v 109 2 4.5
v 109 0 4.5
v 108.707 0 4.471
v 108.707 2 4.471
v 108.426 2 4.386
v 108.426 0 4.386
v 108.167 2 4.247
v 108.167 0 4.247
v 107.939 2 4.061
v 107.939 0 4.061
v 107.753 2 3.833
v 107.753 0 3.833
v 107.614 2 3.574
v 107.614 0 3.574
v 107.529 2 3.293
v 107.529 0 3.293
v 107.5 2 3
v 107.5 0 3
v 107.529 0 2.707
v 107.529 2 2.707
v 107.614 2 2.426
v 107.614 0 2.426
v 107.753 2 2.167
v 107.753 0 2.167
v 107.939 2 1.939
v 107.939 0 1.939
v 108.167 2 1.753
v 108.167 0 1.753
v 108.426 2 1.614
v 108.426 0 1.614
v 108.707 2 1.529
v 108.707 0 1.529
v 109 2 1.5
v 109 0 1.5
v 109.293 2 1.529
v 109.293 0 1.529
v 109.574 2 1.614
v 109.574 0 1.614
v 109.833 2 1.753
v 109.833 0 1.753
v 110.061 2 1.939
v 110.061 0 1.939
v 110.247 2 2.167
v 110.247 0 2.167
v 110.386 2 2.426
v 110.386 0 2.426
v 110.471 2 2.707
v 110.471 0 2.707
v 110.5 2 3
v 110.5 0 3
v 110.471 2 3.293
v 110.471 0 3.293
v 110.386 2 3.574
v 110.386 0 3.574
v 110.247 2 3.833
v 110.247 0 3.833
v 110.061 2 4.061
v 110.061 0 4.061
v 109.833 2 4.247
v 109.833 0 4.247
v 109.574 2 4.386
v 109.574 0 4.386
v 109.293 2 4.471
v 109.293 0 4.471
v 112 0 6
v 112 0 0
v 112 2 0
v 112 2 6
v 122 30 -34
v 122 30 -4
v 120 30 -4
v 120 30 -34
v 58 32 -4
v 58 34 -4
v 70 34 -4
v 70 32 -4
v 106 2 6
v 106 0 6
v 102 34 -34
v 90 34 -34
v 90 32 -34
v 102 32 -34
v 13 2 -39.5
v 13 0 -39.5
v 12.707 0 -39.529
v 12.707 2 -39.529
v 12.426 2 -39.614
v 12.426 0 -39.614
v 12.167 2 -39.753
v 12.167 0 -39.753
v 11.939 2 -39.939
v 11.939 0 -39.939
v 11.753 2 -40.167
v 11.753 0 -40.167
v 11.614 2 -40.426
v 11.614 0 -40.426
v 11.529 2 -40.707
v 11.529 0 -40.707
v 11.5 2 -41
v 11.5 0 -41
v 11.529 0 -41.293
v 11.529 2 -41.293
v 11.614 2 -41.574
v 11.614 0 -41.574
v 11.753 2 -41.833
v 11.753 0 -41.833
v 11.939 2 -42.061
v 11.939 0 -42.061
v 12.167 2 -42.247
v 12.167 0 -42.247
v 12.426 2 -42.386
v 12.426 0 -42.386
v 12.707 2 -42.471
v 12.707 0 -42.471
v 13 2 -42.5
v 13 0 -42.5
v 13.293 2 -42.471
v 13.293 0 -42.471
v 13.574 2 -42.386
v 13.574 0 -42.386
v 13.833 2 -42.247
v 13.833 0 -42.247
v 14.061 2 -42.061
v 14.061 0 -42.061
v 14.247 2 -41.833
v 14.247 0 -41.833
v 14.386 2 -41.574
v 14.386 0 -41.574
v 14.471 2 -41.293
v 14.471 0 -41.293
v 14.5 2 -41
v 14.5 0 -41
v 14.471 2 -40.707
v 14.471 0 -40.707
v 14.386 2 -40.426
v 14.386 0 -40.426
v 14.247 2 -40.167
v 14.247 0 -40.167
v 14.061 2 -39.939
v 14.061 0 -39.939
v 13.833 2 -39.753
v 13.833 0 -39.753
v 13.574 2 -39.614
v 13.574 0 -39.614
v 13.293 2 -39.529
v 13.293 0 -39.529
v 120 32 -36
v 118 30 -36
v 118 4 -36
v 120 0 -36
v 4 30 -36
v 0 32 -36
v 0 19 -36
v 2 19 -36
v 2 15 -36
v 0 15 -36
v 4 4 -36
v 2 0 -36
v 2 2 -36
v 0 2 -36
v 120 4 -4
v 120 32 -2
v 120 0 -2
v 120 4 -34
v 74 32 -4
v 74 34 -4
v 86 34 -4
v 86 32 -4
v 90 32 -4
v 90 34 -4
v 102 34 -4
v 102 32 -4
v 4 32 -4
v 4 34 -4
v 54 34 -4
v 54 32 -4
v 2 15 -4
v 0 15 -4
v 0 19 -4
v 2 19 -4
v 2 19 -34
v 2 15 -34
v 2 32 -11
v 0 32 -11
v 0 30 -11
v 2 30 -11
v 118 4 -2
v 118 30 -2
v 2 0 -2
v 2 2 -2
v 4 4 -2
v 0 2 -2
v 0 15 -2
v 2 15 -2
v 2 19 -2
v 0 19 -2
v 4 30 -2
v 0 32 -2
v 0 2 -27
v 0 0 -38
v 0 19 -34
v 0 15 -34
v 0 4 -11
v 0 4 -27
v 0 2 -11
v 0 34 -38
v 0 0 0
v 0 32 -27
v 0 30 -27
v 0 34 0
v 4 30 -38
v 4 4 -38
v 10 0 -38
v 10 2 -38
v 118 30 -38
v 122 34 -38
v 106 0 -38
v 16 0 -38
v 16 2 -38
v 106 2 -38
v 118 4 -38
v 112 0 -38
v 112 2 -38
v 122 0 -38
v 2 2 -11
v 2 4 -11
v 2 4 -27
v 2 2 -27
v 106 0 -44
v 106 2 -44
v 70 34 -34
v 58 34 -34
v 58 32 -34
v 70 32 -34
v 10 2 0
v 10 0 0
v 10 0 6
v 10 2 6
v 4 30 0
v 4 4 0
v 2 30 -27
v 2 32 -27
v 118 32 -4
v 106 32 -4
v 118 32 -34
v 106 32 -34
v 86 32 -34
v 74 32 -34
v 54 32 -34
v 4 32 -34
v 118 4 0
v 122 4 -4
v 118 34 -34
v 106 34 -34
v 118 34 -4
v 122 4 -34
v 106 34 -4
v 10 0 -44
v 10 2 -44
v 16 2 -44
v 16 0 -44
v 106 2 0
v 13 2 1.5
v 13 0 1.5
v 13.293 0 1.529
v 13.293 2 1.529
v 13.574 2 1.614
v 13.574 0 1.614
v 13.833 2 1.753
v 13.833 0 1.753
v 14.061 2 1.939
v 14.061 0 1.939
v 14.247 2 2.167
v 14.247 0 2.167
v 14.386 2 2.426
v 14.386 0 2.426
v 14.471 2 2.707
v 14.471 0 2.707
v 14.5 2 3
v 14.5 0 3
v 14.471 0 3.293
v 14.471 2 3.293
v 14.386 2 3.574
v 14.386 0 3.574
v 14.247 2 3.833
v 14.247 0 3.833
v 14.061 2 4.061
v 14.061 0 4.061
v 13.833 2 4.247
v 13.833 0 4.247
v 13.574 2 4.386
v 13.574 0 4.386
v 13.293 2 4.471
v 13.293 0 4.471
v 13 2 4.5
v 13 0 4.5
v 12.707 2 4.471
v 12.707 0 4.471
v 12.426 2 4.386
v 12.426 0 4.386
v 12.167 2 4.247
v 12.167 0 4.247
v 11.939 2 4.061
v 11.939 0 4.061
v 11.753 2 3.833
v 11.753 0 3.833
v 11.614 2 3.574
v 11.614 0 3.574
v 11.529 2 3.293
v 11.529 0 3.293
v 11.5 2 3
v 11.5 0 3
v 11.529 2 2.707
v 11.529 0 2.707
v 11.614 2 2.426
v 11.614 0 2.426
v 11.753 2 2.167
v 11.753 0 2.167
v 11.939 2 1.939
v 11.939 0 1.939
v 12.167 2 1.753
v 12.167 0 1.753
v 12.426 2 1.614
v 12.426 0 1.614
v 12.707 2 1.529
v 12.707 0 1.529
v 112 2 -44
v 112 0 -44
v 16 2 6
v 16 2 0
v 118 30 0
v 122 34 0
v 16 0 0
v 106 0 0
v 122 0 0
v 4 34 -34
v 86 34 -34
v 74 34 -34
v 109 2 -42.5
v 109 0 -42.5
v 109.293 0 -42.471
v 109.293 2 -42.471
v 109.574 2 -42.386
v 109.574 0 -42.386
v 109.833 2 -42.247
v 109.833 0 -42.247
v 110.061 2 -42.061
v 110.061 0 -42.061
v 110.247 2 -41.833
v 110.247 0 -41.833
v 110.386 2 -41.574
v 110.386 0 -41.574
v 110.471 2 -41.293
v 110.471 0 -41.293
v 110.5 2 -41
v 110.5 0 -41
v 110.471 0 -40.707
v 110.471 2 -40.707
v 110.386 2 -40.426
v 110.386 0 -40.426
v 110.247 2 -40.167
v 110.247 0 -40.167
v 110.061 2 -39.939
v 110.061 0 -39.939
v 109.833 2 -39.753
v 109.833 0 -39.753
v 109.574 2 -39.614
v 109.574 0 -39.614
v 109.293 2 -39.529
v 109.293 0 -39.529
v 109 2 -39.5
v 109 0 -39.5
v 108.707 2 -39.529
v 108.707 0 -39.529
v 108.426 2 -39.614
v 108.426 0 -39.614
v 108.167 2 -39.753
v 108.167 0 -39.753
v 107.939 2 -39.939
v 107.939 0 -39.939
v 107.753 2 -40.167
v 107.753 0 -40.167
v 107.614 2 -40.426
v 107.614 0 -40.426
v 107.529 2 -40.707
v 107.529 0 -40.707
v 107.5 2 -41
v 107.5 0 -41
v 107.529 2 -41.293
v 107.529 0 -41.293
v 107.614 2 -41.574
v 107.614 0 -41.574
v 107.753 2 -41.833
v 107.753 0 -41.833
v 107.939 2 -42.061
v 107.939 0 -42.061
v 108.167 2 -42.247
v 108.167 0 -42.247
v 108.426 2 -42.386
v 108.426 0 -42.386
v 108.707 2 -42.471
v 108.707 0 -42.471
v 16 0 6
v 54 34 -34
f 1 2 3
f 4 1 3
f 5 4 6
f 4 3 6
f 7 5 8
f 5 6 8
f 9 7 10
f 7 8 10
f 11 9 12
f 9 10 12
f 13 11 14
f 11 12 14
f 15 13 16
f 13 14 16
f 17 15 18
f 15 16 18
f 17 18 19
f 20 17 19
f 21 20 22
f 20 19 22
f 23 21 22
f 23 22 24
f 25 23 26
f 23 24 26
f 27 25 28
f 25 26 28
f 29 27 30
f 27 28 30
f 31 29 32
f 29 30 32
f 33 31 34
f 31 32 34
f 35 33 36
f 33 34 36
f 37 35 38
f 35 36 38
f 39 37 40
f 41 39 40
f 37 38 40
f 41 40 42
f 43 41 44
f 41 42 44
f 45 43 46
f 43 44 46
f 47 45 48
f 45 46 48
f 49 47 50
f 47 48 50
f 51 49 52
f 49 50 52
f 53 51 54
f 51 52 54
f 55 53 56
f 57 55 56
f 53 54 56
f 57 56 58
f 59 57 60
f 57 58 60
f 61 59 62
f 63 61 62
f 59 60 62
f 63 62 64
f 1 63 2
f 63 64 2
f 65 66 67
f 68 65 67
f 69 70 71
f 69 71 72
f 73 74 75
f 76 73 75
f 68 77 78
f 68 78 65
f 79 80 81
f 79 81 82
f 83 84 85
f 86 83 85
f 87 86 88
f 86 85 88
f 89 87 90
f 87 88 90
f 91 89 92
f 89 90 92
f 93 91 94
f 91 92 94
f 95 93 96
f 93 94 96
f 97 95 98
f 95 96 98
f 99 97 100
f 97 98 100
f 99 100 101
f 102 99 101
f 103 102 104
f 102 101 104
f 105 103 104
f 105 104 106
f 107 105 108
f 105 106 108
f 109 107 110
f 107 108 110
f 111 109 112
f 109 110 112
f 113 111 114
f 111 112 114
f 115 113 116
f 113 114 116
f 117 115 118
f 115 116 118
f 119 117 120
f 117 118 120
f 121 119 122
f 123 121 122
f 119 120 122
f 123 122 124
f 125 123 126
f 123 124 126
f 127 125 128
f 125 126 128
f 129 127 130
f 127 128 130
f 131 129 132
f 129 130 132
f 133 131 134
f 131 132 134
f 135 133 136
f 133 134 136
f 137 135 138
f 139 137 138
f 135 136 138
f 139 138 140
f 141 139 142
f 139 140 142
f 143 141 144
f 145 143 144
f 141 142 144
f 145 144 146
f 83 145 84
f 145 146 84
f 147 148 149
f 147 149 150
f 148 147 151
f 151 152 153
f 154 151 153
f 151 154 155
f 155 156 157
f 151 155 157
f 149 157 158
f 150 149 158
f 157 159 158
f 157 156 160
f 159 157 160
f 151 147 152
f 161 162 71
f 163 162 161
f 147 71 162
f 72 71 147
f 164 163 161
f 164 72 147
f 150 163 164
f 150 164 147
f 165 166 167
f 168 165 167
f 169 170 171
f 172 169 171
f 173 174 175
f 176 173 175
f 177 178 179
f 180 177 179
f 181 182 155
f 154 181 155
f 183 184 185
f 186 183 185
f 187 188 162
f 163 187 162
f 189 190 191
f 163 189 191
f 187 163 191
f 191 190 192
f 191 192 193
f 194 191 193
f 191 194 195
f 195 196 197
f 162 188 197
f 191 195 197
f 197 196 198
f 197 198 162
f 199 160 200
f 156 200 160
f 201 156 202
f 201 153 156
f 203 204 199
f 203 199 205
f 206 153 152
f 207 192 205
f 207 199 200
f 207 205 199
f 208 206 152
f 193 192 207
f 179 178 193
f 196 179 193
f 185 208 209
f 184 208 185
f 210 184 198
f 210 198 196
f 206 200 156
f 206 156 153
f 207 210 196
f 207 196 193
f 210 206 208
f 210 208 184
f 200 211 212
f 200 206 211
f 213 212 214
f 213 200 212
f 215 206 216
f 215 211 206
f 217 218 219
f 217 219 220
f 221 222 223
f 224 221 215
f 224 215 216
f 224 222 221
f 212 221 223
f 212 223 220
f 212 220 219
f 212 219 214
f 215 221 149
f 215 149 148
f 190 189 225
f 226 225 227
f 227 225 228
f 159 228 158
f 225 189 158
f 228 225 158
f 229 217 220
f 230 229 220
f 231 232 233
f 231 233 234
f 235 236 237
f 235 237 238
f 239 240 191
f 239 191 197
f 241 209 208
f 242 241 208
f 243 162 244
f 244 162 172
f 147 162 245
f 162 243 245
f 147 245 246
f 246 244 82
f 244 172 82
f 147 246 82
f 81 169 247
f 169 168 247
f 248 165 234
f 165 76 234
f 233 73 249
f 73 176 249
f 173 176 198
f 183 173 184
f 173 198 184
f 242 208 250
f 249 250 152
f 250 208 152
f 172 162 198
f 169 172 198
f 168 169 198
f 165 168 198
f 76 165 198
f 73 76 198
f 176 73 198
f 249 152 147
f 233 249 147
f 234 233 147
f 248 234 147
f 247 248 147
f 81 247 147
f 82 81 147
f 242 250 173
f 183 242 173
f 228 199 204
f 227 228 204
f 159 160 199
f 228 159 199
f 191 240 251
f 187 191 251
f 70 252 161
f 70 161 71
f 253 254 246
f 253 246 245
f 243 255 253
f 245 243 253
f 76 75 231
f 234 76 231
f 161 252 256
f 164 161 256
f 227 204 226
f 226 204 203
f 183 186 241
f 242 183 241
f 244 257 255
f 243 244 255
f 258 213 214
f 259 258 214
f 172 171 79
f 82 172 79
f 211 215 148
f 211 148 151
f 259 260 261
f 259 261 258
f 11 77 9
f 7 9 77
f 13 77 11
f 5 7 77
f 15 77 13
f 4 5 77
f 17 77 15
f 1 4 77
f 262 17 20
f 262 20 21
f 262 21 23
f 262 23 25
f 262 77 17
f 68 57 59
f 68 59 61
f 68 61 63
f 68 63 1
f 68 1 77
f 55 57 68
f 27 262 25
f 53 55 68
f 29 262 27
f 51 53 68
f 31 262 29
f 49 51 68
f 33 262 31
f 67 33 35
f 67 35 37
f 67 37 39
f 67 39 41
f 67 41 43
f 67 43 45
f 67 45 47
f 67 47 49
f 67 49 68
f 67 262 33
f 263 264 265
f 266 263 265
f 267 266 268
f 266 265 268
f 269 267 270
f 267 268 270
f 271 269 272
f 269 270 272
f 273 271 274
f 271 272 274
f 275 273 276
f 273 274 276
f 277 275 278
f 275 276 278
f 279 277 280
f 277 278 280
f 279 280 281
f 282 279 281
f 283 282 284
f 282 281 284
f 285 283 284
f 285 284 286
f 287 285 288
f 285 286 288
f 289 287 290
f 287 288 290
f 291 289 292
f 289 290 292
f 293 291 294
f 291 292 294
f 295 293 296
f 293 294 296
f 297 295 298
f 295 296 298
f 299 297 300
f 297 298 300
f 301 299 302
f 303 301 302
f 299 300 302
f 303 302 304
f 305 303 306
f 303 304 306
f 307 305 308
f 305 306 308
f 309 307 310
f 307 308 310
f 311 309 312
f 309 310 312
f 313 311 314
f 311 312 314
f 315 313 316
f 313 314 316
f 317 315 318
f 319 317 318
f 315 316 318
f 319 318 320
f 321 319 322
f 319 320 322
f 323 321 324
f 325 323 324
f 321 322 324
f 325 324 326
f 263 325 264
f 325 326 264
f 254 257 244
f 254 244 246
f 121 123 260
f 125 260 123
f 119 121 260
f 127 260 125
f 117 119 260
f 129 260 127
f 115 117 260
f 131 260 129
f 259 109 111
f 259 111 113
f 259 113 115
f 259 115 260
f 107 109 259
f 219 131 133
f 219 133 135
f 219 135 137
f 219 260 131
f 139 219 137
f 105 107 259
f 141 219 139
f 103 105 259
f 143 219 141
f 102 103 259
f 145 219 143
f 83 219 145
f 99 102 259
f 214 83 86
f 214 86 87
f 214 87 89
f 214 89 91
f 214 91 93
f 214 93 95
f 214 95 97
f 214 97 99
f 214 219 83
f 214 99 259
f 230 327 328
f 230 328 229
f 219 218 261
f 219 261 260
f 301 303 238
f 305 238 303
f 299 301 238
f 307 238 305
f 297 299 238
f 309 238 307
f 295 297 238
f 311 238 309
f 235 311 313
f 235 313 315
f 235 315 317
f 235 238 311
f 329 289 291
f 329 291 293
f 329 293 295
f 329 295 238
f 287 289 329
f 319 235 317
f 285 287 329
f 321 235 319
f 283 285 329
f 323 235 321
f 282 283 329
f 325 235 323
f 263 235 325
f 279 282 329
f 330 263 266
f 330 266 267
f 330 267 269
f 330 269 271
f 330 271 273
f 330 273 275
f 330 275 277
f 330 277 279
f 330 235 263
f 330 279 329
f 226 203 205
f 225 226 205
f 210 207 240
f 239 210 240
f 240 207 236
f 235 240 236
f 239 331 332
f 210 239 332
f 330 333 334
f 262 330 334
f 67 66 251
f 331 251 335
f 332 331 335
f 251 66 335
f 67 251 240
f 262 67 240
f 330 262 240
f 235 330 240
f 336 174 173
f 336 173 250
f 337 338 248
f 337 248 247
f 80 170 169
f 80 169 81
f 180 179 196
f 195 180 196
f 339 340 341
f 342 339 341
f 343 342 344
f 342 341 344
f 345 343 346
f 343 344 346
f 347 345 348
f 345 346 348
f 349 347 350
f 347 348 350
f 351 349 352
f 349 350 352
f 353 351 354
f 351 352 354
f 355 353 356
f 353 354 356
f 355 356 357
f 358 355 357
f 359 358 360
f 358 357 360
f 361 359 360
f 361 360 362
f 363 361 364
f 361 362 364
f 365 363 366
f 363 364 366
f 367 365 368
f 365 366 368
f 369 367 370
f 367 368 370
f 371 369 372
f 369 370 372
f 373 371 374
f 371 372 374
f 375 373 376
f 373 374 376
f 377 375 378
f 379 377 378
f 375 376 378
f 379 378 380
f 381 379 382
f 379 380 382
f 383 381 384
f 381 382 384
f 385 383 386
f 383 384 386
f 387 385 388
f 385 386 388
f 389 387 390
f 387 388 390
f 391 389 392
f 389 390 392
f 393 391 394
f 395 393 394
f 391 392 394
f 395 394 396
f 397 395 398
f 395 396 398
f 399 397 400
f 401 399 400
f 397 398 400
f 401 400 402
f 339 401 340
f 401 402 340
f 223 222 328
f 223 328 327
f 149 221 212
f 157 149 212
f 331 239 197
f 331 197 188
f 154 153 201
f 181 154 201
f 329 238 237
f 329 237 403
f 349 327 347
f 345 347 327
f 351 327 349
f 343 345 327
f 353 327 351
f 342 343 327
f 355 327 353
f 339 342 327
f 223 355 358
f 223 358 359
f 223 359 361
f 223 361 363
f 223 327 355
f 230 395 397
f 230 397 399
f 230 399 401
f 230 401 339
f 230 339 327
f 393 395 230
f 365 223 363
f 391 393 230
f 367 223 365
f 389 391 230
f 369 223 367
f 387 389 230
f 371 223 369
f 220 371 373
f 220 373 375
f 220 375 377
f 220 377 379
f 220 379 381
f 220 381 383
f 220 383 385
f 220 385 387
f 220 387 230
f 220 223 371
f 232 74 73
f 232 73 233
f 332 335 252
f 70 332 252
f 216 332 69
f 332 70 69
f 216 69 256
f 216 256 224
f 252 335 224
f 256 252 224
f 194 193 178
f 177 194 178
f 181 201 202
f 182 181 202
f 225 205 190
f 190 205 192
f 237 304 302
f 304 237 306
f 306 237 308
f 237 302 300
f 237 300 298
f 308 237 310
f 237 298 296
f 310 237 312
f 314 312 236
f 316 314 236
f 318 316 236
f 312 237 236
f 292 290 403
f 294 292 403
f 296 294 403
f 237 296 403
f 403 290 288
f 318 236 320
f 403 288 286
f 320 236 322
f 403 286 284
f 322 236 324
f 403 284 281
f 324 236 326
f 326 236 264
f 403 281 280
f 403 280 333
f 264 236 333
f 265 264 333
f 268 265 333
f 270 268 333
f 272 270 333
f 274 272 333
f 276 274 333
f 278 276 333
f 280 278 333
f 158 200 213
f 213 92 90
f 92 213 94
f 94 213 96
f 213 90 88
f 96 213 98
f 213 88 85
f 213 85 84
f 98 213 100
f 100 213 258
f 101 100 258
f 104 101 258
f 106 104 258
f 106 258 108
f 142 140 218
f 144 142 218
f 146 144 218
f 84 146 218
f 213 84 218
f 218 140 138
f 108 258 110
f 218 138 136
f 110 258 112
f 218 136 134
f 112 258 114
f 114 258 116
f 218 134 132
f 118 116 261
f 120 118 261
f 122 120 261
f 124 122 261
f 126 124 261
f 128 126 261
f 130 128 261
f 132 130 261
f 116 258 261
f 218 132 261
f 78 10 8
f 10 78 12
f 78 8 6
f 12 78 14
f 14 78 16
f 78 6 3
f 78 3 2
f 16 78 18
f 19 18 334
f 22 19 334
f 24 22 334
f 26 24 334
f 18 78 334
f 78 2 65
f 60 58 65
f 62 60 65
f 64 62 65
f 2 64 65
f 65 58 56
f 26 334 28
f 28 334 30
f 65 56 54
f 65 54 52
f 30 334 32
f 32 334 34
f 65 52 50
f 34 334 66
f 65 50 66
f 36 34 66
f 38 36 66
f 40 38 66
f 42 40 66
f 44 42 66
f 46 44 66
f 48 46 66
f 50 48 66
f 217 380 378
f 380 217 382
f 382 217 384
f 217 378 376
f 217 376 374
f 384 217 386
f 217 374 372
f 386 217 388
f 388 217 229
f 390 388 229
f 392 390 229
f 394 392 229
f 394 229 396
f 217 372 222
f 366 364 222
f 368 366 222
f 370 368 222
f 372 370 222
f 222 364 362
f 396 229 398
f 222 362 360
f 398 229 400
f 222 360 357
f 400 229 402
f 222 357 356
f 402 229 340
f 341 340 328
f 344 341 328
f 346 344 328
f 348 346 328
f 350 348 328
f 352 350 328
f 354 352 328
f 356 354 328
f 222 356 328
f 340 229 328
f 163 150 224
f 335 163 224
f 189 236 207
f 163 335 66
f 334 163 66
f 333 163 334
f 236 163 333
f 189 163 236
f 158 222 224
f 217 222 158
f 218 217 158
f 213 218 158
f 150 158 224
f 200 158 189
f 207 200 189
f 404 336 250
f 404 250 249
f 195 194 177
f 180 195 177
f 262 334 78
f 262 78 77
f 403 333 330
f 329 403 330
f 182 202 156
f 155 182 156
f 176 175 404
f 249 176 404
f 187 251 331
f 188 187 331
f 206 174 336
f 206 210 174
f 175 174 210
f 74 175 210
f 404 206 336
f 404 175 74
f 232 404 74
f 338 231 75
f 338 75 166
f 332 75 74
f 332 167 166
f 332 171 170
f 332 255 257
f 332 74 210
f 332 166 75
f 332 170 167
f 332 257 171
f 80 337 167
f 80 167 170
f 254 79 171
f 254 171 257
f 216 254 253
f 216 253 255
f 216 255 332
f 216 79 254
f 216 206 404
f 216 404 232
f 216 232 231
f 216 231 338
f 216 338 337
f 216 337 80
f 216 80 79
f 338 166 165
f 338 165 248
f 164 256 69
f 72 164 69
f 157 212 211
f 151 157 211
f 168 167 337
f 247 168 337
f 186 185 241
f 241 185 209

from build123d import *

# Parameters (mm, degrees)
SKETCH1_W           = 122
SKETCH1_H           = 38
SKETCH1_W_2         = 118
SKETCH1_H_2         = 34
BOSS_EXTRUDE1_DEPTH = 34
SKETCH2_W           = 34
SKETCH2_H           = 2
BOSS_EXTRUDE2_DEPTH = 120
CUT_EXTRUDE2_DEPTH  = 2
SKETCH4_W           = 114
SKETCH4_H           = 26
CUT_EXTRUDE4_DEPTH  = 2
SKETCH6_W           = 114
SKETCH6_H           = 26
CUT_EXTRUDE5_DEPTH  = 2
SKETCH7_W           = 30
SKETCH7_H           = 26
CUT_EXTRUDE6_DEPTH  = 2
SKETCH8_W           = 12
SKETCH8_H           = 30
CUT_EXTRUDE7_DEPTH  = 2
LPATTERN1_COUNT     = 4
LPATTERN1_PITCH     = 16
SKETCH9_W           = 50
SKETCH9_H           = 30
CUT_EXTRUDE8_DEPTH  = 2
SKETCH10_W          = 6
SKETCH10_H          = 2
BOSS_EXTRUDE5_DEPTH = 6
SKETCH11_W          = 6
SKETCH11_H          = 2
BOSS_EXTRUDE6_DEPTH = 6
SKETCH12_W          = 6
SKETCH12_H          = 2
BOSS_EXTRUDE7_DEPTH = 6
SKETCH13_W          = 6
SKETCH13_H          = 2
BOSS_EXTRUDE8_DEPTH = 6
SKETCH14_R          = 1.5
CUT_EXTRUDE9_DEPTH  = 2


with BuildPart() as part:
    # Sketch1 → Boss-Extrude1 (new body)
    with BuildSketch(Plane(origin=(0, 0, 0), x_dir=(1, 0, 0), z_dir=(0, 1, 0))):
        with Locations((61, 19)):
            Rectangle(SKETCH1_W, SKETCH1_H)
        with Locations((61, 19)):
            Rectangle(SKETCH1_W_2, SKETCH1_H_2, mode=Mode.SUBTRACT)
    extrude(amount=BOSS_EXTRUDE1_DEPTH)

    # Sketch2 → Boss-Extrude2 (add)
    with BuildSketch(Plane.ZY):
        with Locations((-19, 33)):
            Rectangle(SKETCH2_W, SKETCH2_H)
    extrude(amount=-BOSS_EXTRUDE2_DEPTH)

    # Sketch3 → Cut-Extrude2 (cut)
    with BuildSketch(Plane.ZY):
        Polygon((-8, 2), (-2, 2), (-2, 15), (-4, 15), (-4, 19), (-2, 19), (-2, 32), (-11, 32), (-11, 30), (-27, 30), (-27, 32), (-36, 32), (-36, 19), (-34, 19), (-34, 15), (-36, 15), (-36, 2), (-30, 2), (-27, 2), (-27, 4), (-11, 4), (-11, 2), align=None)
    extrude(amount=-CUT_EXTRUDE2_DEPTH, mode=Mode.SUBTRACT)

    # Sketch4 → Cut-Extrude4 (cut)
    with BuildSketch(Plane(origin=(0, 0, -38), x_dir=(-1, 0, 0), z_dir=(0, 0, -1))):
        with Locations((-61, 17)):
            Rectangle(SKETCH4_W, SKETCH4_H)
    extrude(amount=-CUT_EXTRUDE4_DEPTH, mode=Mode.SUBTRACT)

    # Sketch6 → Cut-Extrude5 (cut)
    with BuildSketch(Plane.XY):
        with Locations((61, 17)):
            Rectangle(SKETCH6_W, SKETCH6_H)
    extrude(amount=-CUT_EXTRUDE5_DEPTH, mode=Mode.SUBTRACT)

    # Sketch7 → Cut-Extrude6 (cut)
    with BuildSketch(Plane(origin=(122, 0, 0), x_dir=(0, 0, -1), z_dir=(1, 0, 0))):
        with Locations((19, 17)):
            Rectangle(SKETCH7_W, SKETCH7_H)
    extrude(amount=-CUT_EXTRUDE6_DEPTH, mode=Mode.SUBTRACT)

    # Sketch8 → Cut-Extrude7 (cut)
    with BuildSketch(Plane(origin=(0, 34, 0), x_dir=(1, 0, 0), z_dir=(0, 1, 0))):
        with Locations((112, 19)):
            Rectangle(SKETCH8_W, SKETCH8_H)
    cut_extrude7 = extrude(amount=-CUT_EXTRUDE7_DEPTH, mode=Mode.SUBTRACT)

    # LPattern1: Cut-Extrude7 ×4
    with Locations(*[(-i * LPATTERN1_PITCH, 0, 0) for i in range(1, LPATTERN1_COUNT)]):
        add(cut_extrude7, mode=Mode.SUBTRACT)

    # Sketch9 → Cut-Extrude8 (cut)
    with BuildSketch(Plane(origin=(0, 34, 0), x_dir=(1, 0, 0), z_dir=(0, 1, 0))):
        with Locations((29, 19)):
            Rectangle(SKETCH9_W, SKETCH9_H)
    extrude(amount=-CUT_EXTRUDE8_DEPTH, mode=Mode.SUBTRACT)

    # Sketch10 → Boss-Extrude5 (add)
    with BuildSketch(Plane(origin=(0, 0, -38), x_dir=(-1, 0, 0), z_dir=(0, 0, -1))):
        with Locations((-13, 1)):
            Rectangle(SKETCH10_W, SKETCH10_H)
    extrude(amount=BOSS_EXTRUDE5_DEPTH)

    # Sketch11 → Boss-Extrude6 (add)
    with BuildSketch(Plane(origin=(0, 0, -38), x_dir=(-1, 0, 0), z_dir=(0, 0, -1))):
        with Locations((-109, 1)):
            Rectangle(SKETCH11_W, SKETCH11_H)
    extrude(amount=BOSS_EXTRUDE6_DEPTH)

    # Sketch12 → Boss-Extrude7 (add)
    with BuildSketch(Plane.XY):
        with Locations((13, 1)):
            Rectangle(SKETCH12_W, SKETCH12_H)
    extrude(amount=BOSS_EXTRUDE7_DEPTH)

    # Sketch13 → Boss-Extrude8 (add)
    with BuildSketch(Plane.XY):
        with Locations((109, 1)):
            Rectangle(SKETCH13_W, SKETCH13_H)
    extrude(amount=BOSS_EXTRUDE8_DEPTH)

    # Sketch14 → Cut-Extrude9 (cut)
    with BuildSketch(Plane.XZ):
        with Locations(Location((109, -41, 0), (0, 0, 270))):
            Circle(SKETCH14_R)
        with Locations(Location((109, 3, 0), (0, 0, 90))):
            Circle(SKETCH14_R)
        with Locations(Location((13, 3, 0), (0, 0, 270))):
            Circle(SKETCH14_R)
        with Locations(Location((13, -41, 0), (0, 0, 90))):
            Circle(SKETCH14_R)
    extrude(amount=-CUT_EXTRUDE9_DEPTH, mode=Mode.SUBTRACT)


solid = part.part
